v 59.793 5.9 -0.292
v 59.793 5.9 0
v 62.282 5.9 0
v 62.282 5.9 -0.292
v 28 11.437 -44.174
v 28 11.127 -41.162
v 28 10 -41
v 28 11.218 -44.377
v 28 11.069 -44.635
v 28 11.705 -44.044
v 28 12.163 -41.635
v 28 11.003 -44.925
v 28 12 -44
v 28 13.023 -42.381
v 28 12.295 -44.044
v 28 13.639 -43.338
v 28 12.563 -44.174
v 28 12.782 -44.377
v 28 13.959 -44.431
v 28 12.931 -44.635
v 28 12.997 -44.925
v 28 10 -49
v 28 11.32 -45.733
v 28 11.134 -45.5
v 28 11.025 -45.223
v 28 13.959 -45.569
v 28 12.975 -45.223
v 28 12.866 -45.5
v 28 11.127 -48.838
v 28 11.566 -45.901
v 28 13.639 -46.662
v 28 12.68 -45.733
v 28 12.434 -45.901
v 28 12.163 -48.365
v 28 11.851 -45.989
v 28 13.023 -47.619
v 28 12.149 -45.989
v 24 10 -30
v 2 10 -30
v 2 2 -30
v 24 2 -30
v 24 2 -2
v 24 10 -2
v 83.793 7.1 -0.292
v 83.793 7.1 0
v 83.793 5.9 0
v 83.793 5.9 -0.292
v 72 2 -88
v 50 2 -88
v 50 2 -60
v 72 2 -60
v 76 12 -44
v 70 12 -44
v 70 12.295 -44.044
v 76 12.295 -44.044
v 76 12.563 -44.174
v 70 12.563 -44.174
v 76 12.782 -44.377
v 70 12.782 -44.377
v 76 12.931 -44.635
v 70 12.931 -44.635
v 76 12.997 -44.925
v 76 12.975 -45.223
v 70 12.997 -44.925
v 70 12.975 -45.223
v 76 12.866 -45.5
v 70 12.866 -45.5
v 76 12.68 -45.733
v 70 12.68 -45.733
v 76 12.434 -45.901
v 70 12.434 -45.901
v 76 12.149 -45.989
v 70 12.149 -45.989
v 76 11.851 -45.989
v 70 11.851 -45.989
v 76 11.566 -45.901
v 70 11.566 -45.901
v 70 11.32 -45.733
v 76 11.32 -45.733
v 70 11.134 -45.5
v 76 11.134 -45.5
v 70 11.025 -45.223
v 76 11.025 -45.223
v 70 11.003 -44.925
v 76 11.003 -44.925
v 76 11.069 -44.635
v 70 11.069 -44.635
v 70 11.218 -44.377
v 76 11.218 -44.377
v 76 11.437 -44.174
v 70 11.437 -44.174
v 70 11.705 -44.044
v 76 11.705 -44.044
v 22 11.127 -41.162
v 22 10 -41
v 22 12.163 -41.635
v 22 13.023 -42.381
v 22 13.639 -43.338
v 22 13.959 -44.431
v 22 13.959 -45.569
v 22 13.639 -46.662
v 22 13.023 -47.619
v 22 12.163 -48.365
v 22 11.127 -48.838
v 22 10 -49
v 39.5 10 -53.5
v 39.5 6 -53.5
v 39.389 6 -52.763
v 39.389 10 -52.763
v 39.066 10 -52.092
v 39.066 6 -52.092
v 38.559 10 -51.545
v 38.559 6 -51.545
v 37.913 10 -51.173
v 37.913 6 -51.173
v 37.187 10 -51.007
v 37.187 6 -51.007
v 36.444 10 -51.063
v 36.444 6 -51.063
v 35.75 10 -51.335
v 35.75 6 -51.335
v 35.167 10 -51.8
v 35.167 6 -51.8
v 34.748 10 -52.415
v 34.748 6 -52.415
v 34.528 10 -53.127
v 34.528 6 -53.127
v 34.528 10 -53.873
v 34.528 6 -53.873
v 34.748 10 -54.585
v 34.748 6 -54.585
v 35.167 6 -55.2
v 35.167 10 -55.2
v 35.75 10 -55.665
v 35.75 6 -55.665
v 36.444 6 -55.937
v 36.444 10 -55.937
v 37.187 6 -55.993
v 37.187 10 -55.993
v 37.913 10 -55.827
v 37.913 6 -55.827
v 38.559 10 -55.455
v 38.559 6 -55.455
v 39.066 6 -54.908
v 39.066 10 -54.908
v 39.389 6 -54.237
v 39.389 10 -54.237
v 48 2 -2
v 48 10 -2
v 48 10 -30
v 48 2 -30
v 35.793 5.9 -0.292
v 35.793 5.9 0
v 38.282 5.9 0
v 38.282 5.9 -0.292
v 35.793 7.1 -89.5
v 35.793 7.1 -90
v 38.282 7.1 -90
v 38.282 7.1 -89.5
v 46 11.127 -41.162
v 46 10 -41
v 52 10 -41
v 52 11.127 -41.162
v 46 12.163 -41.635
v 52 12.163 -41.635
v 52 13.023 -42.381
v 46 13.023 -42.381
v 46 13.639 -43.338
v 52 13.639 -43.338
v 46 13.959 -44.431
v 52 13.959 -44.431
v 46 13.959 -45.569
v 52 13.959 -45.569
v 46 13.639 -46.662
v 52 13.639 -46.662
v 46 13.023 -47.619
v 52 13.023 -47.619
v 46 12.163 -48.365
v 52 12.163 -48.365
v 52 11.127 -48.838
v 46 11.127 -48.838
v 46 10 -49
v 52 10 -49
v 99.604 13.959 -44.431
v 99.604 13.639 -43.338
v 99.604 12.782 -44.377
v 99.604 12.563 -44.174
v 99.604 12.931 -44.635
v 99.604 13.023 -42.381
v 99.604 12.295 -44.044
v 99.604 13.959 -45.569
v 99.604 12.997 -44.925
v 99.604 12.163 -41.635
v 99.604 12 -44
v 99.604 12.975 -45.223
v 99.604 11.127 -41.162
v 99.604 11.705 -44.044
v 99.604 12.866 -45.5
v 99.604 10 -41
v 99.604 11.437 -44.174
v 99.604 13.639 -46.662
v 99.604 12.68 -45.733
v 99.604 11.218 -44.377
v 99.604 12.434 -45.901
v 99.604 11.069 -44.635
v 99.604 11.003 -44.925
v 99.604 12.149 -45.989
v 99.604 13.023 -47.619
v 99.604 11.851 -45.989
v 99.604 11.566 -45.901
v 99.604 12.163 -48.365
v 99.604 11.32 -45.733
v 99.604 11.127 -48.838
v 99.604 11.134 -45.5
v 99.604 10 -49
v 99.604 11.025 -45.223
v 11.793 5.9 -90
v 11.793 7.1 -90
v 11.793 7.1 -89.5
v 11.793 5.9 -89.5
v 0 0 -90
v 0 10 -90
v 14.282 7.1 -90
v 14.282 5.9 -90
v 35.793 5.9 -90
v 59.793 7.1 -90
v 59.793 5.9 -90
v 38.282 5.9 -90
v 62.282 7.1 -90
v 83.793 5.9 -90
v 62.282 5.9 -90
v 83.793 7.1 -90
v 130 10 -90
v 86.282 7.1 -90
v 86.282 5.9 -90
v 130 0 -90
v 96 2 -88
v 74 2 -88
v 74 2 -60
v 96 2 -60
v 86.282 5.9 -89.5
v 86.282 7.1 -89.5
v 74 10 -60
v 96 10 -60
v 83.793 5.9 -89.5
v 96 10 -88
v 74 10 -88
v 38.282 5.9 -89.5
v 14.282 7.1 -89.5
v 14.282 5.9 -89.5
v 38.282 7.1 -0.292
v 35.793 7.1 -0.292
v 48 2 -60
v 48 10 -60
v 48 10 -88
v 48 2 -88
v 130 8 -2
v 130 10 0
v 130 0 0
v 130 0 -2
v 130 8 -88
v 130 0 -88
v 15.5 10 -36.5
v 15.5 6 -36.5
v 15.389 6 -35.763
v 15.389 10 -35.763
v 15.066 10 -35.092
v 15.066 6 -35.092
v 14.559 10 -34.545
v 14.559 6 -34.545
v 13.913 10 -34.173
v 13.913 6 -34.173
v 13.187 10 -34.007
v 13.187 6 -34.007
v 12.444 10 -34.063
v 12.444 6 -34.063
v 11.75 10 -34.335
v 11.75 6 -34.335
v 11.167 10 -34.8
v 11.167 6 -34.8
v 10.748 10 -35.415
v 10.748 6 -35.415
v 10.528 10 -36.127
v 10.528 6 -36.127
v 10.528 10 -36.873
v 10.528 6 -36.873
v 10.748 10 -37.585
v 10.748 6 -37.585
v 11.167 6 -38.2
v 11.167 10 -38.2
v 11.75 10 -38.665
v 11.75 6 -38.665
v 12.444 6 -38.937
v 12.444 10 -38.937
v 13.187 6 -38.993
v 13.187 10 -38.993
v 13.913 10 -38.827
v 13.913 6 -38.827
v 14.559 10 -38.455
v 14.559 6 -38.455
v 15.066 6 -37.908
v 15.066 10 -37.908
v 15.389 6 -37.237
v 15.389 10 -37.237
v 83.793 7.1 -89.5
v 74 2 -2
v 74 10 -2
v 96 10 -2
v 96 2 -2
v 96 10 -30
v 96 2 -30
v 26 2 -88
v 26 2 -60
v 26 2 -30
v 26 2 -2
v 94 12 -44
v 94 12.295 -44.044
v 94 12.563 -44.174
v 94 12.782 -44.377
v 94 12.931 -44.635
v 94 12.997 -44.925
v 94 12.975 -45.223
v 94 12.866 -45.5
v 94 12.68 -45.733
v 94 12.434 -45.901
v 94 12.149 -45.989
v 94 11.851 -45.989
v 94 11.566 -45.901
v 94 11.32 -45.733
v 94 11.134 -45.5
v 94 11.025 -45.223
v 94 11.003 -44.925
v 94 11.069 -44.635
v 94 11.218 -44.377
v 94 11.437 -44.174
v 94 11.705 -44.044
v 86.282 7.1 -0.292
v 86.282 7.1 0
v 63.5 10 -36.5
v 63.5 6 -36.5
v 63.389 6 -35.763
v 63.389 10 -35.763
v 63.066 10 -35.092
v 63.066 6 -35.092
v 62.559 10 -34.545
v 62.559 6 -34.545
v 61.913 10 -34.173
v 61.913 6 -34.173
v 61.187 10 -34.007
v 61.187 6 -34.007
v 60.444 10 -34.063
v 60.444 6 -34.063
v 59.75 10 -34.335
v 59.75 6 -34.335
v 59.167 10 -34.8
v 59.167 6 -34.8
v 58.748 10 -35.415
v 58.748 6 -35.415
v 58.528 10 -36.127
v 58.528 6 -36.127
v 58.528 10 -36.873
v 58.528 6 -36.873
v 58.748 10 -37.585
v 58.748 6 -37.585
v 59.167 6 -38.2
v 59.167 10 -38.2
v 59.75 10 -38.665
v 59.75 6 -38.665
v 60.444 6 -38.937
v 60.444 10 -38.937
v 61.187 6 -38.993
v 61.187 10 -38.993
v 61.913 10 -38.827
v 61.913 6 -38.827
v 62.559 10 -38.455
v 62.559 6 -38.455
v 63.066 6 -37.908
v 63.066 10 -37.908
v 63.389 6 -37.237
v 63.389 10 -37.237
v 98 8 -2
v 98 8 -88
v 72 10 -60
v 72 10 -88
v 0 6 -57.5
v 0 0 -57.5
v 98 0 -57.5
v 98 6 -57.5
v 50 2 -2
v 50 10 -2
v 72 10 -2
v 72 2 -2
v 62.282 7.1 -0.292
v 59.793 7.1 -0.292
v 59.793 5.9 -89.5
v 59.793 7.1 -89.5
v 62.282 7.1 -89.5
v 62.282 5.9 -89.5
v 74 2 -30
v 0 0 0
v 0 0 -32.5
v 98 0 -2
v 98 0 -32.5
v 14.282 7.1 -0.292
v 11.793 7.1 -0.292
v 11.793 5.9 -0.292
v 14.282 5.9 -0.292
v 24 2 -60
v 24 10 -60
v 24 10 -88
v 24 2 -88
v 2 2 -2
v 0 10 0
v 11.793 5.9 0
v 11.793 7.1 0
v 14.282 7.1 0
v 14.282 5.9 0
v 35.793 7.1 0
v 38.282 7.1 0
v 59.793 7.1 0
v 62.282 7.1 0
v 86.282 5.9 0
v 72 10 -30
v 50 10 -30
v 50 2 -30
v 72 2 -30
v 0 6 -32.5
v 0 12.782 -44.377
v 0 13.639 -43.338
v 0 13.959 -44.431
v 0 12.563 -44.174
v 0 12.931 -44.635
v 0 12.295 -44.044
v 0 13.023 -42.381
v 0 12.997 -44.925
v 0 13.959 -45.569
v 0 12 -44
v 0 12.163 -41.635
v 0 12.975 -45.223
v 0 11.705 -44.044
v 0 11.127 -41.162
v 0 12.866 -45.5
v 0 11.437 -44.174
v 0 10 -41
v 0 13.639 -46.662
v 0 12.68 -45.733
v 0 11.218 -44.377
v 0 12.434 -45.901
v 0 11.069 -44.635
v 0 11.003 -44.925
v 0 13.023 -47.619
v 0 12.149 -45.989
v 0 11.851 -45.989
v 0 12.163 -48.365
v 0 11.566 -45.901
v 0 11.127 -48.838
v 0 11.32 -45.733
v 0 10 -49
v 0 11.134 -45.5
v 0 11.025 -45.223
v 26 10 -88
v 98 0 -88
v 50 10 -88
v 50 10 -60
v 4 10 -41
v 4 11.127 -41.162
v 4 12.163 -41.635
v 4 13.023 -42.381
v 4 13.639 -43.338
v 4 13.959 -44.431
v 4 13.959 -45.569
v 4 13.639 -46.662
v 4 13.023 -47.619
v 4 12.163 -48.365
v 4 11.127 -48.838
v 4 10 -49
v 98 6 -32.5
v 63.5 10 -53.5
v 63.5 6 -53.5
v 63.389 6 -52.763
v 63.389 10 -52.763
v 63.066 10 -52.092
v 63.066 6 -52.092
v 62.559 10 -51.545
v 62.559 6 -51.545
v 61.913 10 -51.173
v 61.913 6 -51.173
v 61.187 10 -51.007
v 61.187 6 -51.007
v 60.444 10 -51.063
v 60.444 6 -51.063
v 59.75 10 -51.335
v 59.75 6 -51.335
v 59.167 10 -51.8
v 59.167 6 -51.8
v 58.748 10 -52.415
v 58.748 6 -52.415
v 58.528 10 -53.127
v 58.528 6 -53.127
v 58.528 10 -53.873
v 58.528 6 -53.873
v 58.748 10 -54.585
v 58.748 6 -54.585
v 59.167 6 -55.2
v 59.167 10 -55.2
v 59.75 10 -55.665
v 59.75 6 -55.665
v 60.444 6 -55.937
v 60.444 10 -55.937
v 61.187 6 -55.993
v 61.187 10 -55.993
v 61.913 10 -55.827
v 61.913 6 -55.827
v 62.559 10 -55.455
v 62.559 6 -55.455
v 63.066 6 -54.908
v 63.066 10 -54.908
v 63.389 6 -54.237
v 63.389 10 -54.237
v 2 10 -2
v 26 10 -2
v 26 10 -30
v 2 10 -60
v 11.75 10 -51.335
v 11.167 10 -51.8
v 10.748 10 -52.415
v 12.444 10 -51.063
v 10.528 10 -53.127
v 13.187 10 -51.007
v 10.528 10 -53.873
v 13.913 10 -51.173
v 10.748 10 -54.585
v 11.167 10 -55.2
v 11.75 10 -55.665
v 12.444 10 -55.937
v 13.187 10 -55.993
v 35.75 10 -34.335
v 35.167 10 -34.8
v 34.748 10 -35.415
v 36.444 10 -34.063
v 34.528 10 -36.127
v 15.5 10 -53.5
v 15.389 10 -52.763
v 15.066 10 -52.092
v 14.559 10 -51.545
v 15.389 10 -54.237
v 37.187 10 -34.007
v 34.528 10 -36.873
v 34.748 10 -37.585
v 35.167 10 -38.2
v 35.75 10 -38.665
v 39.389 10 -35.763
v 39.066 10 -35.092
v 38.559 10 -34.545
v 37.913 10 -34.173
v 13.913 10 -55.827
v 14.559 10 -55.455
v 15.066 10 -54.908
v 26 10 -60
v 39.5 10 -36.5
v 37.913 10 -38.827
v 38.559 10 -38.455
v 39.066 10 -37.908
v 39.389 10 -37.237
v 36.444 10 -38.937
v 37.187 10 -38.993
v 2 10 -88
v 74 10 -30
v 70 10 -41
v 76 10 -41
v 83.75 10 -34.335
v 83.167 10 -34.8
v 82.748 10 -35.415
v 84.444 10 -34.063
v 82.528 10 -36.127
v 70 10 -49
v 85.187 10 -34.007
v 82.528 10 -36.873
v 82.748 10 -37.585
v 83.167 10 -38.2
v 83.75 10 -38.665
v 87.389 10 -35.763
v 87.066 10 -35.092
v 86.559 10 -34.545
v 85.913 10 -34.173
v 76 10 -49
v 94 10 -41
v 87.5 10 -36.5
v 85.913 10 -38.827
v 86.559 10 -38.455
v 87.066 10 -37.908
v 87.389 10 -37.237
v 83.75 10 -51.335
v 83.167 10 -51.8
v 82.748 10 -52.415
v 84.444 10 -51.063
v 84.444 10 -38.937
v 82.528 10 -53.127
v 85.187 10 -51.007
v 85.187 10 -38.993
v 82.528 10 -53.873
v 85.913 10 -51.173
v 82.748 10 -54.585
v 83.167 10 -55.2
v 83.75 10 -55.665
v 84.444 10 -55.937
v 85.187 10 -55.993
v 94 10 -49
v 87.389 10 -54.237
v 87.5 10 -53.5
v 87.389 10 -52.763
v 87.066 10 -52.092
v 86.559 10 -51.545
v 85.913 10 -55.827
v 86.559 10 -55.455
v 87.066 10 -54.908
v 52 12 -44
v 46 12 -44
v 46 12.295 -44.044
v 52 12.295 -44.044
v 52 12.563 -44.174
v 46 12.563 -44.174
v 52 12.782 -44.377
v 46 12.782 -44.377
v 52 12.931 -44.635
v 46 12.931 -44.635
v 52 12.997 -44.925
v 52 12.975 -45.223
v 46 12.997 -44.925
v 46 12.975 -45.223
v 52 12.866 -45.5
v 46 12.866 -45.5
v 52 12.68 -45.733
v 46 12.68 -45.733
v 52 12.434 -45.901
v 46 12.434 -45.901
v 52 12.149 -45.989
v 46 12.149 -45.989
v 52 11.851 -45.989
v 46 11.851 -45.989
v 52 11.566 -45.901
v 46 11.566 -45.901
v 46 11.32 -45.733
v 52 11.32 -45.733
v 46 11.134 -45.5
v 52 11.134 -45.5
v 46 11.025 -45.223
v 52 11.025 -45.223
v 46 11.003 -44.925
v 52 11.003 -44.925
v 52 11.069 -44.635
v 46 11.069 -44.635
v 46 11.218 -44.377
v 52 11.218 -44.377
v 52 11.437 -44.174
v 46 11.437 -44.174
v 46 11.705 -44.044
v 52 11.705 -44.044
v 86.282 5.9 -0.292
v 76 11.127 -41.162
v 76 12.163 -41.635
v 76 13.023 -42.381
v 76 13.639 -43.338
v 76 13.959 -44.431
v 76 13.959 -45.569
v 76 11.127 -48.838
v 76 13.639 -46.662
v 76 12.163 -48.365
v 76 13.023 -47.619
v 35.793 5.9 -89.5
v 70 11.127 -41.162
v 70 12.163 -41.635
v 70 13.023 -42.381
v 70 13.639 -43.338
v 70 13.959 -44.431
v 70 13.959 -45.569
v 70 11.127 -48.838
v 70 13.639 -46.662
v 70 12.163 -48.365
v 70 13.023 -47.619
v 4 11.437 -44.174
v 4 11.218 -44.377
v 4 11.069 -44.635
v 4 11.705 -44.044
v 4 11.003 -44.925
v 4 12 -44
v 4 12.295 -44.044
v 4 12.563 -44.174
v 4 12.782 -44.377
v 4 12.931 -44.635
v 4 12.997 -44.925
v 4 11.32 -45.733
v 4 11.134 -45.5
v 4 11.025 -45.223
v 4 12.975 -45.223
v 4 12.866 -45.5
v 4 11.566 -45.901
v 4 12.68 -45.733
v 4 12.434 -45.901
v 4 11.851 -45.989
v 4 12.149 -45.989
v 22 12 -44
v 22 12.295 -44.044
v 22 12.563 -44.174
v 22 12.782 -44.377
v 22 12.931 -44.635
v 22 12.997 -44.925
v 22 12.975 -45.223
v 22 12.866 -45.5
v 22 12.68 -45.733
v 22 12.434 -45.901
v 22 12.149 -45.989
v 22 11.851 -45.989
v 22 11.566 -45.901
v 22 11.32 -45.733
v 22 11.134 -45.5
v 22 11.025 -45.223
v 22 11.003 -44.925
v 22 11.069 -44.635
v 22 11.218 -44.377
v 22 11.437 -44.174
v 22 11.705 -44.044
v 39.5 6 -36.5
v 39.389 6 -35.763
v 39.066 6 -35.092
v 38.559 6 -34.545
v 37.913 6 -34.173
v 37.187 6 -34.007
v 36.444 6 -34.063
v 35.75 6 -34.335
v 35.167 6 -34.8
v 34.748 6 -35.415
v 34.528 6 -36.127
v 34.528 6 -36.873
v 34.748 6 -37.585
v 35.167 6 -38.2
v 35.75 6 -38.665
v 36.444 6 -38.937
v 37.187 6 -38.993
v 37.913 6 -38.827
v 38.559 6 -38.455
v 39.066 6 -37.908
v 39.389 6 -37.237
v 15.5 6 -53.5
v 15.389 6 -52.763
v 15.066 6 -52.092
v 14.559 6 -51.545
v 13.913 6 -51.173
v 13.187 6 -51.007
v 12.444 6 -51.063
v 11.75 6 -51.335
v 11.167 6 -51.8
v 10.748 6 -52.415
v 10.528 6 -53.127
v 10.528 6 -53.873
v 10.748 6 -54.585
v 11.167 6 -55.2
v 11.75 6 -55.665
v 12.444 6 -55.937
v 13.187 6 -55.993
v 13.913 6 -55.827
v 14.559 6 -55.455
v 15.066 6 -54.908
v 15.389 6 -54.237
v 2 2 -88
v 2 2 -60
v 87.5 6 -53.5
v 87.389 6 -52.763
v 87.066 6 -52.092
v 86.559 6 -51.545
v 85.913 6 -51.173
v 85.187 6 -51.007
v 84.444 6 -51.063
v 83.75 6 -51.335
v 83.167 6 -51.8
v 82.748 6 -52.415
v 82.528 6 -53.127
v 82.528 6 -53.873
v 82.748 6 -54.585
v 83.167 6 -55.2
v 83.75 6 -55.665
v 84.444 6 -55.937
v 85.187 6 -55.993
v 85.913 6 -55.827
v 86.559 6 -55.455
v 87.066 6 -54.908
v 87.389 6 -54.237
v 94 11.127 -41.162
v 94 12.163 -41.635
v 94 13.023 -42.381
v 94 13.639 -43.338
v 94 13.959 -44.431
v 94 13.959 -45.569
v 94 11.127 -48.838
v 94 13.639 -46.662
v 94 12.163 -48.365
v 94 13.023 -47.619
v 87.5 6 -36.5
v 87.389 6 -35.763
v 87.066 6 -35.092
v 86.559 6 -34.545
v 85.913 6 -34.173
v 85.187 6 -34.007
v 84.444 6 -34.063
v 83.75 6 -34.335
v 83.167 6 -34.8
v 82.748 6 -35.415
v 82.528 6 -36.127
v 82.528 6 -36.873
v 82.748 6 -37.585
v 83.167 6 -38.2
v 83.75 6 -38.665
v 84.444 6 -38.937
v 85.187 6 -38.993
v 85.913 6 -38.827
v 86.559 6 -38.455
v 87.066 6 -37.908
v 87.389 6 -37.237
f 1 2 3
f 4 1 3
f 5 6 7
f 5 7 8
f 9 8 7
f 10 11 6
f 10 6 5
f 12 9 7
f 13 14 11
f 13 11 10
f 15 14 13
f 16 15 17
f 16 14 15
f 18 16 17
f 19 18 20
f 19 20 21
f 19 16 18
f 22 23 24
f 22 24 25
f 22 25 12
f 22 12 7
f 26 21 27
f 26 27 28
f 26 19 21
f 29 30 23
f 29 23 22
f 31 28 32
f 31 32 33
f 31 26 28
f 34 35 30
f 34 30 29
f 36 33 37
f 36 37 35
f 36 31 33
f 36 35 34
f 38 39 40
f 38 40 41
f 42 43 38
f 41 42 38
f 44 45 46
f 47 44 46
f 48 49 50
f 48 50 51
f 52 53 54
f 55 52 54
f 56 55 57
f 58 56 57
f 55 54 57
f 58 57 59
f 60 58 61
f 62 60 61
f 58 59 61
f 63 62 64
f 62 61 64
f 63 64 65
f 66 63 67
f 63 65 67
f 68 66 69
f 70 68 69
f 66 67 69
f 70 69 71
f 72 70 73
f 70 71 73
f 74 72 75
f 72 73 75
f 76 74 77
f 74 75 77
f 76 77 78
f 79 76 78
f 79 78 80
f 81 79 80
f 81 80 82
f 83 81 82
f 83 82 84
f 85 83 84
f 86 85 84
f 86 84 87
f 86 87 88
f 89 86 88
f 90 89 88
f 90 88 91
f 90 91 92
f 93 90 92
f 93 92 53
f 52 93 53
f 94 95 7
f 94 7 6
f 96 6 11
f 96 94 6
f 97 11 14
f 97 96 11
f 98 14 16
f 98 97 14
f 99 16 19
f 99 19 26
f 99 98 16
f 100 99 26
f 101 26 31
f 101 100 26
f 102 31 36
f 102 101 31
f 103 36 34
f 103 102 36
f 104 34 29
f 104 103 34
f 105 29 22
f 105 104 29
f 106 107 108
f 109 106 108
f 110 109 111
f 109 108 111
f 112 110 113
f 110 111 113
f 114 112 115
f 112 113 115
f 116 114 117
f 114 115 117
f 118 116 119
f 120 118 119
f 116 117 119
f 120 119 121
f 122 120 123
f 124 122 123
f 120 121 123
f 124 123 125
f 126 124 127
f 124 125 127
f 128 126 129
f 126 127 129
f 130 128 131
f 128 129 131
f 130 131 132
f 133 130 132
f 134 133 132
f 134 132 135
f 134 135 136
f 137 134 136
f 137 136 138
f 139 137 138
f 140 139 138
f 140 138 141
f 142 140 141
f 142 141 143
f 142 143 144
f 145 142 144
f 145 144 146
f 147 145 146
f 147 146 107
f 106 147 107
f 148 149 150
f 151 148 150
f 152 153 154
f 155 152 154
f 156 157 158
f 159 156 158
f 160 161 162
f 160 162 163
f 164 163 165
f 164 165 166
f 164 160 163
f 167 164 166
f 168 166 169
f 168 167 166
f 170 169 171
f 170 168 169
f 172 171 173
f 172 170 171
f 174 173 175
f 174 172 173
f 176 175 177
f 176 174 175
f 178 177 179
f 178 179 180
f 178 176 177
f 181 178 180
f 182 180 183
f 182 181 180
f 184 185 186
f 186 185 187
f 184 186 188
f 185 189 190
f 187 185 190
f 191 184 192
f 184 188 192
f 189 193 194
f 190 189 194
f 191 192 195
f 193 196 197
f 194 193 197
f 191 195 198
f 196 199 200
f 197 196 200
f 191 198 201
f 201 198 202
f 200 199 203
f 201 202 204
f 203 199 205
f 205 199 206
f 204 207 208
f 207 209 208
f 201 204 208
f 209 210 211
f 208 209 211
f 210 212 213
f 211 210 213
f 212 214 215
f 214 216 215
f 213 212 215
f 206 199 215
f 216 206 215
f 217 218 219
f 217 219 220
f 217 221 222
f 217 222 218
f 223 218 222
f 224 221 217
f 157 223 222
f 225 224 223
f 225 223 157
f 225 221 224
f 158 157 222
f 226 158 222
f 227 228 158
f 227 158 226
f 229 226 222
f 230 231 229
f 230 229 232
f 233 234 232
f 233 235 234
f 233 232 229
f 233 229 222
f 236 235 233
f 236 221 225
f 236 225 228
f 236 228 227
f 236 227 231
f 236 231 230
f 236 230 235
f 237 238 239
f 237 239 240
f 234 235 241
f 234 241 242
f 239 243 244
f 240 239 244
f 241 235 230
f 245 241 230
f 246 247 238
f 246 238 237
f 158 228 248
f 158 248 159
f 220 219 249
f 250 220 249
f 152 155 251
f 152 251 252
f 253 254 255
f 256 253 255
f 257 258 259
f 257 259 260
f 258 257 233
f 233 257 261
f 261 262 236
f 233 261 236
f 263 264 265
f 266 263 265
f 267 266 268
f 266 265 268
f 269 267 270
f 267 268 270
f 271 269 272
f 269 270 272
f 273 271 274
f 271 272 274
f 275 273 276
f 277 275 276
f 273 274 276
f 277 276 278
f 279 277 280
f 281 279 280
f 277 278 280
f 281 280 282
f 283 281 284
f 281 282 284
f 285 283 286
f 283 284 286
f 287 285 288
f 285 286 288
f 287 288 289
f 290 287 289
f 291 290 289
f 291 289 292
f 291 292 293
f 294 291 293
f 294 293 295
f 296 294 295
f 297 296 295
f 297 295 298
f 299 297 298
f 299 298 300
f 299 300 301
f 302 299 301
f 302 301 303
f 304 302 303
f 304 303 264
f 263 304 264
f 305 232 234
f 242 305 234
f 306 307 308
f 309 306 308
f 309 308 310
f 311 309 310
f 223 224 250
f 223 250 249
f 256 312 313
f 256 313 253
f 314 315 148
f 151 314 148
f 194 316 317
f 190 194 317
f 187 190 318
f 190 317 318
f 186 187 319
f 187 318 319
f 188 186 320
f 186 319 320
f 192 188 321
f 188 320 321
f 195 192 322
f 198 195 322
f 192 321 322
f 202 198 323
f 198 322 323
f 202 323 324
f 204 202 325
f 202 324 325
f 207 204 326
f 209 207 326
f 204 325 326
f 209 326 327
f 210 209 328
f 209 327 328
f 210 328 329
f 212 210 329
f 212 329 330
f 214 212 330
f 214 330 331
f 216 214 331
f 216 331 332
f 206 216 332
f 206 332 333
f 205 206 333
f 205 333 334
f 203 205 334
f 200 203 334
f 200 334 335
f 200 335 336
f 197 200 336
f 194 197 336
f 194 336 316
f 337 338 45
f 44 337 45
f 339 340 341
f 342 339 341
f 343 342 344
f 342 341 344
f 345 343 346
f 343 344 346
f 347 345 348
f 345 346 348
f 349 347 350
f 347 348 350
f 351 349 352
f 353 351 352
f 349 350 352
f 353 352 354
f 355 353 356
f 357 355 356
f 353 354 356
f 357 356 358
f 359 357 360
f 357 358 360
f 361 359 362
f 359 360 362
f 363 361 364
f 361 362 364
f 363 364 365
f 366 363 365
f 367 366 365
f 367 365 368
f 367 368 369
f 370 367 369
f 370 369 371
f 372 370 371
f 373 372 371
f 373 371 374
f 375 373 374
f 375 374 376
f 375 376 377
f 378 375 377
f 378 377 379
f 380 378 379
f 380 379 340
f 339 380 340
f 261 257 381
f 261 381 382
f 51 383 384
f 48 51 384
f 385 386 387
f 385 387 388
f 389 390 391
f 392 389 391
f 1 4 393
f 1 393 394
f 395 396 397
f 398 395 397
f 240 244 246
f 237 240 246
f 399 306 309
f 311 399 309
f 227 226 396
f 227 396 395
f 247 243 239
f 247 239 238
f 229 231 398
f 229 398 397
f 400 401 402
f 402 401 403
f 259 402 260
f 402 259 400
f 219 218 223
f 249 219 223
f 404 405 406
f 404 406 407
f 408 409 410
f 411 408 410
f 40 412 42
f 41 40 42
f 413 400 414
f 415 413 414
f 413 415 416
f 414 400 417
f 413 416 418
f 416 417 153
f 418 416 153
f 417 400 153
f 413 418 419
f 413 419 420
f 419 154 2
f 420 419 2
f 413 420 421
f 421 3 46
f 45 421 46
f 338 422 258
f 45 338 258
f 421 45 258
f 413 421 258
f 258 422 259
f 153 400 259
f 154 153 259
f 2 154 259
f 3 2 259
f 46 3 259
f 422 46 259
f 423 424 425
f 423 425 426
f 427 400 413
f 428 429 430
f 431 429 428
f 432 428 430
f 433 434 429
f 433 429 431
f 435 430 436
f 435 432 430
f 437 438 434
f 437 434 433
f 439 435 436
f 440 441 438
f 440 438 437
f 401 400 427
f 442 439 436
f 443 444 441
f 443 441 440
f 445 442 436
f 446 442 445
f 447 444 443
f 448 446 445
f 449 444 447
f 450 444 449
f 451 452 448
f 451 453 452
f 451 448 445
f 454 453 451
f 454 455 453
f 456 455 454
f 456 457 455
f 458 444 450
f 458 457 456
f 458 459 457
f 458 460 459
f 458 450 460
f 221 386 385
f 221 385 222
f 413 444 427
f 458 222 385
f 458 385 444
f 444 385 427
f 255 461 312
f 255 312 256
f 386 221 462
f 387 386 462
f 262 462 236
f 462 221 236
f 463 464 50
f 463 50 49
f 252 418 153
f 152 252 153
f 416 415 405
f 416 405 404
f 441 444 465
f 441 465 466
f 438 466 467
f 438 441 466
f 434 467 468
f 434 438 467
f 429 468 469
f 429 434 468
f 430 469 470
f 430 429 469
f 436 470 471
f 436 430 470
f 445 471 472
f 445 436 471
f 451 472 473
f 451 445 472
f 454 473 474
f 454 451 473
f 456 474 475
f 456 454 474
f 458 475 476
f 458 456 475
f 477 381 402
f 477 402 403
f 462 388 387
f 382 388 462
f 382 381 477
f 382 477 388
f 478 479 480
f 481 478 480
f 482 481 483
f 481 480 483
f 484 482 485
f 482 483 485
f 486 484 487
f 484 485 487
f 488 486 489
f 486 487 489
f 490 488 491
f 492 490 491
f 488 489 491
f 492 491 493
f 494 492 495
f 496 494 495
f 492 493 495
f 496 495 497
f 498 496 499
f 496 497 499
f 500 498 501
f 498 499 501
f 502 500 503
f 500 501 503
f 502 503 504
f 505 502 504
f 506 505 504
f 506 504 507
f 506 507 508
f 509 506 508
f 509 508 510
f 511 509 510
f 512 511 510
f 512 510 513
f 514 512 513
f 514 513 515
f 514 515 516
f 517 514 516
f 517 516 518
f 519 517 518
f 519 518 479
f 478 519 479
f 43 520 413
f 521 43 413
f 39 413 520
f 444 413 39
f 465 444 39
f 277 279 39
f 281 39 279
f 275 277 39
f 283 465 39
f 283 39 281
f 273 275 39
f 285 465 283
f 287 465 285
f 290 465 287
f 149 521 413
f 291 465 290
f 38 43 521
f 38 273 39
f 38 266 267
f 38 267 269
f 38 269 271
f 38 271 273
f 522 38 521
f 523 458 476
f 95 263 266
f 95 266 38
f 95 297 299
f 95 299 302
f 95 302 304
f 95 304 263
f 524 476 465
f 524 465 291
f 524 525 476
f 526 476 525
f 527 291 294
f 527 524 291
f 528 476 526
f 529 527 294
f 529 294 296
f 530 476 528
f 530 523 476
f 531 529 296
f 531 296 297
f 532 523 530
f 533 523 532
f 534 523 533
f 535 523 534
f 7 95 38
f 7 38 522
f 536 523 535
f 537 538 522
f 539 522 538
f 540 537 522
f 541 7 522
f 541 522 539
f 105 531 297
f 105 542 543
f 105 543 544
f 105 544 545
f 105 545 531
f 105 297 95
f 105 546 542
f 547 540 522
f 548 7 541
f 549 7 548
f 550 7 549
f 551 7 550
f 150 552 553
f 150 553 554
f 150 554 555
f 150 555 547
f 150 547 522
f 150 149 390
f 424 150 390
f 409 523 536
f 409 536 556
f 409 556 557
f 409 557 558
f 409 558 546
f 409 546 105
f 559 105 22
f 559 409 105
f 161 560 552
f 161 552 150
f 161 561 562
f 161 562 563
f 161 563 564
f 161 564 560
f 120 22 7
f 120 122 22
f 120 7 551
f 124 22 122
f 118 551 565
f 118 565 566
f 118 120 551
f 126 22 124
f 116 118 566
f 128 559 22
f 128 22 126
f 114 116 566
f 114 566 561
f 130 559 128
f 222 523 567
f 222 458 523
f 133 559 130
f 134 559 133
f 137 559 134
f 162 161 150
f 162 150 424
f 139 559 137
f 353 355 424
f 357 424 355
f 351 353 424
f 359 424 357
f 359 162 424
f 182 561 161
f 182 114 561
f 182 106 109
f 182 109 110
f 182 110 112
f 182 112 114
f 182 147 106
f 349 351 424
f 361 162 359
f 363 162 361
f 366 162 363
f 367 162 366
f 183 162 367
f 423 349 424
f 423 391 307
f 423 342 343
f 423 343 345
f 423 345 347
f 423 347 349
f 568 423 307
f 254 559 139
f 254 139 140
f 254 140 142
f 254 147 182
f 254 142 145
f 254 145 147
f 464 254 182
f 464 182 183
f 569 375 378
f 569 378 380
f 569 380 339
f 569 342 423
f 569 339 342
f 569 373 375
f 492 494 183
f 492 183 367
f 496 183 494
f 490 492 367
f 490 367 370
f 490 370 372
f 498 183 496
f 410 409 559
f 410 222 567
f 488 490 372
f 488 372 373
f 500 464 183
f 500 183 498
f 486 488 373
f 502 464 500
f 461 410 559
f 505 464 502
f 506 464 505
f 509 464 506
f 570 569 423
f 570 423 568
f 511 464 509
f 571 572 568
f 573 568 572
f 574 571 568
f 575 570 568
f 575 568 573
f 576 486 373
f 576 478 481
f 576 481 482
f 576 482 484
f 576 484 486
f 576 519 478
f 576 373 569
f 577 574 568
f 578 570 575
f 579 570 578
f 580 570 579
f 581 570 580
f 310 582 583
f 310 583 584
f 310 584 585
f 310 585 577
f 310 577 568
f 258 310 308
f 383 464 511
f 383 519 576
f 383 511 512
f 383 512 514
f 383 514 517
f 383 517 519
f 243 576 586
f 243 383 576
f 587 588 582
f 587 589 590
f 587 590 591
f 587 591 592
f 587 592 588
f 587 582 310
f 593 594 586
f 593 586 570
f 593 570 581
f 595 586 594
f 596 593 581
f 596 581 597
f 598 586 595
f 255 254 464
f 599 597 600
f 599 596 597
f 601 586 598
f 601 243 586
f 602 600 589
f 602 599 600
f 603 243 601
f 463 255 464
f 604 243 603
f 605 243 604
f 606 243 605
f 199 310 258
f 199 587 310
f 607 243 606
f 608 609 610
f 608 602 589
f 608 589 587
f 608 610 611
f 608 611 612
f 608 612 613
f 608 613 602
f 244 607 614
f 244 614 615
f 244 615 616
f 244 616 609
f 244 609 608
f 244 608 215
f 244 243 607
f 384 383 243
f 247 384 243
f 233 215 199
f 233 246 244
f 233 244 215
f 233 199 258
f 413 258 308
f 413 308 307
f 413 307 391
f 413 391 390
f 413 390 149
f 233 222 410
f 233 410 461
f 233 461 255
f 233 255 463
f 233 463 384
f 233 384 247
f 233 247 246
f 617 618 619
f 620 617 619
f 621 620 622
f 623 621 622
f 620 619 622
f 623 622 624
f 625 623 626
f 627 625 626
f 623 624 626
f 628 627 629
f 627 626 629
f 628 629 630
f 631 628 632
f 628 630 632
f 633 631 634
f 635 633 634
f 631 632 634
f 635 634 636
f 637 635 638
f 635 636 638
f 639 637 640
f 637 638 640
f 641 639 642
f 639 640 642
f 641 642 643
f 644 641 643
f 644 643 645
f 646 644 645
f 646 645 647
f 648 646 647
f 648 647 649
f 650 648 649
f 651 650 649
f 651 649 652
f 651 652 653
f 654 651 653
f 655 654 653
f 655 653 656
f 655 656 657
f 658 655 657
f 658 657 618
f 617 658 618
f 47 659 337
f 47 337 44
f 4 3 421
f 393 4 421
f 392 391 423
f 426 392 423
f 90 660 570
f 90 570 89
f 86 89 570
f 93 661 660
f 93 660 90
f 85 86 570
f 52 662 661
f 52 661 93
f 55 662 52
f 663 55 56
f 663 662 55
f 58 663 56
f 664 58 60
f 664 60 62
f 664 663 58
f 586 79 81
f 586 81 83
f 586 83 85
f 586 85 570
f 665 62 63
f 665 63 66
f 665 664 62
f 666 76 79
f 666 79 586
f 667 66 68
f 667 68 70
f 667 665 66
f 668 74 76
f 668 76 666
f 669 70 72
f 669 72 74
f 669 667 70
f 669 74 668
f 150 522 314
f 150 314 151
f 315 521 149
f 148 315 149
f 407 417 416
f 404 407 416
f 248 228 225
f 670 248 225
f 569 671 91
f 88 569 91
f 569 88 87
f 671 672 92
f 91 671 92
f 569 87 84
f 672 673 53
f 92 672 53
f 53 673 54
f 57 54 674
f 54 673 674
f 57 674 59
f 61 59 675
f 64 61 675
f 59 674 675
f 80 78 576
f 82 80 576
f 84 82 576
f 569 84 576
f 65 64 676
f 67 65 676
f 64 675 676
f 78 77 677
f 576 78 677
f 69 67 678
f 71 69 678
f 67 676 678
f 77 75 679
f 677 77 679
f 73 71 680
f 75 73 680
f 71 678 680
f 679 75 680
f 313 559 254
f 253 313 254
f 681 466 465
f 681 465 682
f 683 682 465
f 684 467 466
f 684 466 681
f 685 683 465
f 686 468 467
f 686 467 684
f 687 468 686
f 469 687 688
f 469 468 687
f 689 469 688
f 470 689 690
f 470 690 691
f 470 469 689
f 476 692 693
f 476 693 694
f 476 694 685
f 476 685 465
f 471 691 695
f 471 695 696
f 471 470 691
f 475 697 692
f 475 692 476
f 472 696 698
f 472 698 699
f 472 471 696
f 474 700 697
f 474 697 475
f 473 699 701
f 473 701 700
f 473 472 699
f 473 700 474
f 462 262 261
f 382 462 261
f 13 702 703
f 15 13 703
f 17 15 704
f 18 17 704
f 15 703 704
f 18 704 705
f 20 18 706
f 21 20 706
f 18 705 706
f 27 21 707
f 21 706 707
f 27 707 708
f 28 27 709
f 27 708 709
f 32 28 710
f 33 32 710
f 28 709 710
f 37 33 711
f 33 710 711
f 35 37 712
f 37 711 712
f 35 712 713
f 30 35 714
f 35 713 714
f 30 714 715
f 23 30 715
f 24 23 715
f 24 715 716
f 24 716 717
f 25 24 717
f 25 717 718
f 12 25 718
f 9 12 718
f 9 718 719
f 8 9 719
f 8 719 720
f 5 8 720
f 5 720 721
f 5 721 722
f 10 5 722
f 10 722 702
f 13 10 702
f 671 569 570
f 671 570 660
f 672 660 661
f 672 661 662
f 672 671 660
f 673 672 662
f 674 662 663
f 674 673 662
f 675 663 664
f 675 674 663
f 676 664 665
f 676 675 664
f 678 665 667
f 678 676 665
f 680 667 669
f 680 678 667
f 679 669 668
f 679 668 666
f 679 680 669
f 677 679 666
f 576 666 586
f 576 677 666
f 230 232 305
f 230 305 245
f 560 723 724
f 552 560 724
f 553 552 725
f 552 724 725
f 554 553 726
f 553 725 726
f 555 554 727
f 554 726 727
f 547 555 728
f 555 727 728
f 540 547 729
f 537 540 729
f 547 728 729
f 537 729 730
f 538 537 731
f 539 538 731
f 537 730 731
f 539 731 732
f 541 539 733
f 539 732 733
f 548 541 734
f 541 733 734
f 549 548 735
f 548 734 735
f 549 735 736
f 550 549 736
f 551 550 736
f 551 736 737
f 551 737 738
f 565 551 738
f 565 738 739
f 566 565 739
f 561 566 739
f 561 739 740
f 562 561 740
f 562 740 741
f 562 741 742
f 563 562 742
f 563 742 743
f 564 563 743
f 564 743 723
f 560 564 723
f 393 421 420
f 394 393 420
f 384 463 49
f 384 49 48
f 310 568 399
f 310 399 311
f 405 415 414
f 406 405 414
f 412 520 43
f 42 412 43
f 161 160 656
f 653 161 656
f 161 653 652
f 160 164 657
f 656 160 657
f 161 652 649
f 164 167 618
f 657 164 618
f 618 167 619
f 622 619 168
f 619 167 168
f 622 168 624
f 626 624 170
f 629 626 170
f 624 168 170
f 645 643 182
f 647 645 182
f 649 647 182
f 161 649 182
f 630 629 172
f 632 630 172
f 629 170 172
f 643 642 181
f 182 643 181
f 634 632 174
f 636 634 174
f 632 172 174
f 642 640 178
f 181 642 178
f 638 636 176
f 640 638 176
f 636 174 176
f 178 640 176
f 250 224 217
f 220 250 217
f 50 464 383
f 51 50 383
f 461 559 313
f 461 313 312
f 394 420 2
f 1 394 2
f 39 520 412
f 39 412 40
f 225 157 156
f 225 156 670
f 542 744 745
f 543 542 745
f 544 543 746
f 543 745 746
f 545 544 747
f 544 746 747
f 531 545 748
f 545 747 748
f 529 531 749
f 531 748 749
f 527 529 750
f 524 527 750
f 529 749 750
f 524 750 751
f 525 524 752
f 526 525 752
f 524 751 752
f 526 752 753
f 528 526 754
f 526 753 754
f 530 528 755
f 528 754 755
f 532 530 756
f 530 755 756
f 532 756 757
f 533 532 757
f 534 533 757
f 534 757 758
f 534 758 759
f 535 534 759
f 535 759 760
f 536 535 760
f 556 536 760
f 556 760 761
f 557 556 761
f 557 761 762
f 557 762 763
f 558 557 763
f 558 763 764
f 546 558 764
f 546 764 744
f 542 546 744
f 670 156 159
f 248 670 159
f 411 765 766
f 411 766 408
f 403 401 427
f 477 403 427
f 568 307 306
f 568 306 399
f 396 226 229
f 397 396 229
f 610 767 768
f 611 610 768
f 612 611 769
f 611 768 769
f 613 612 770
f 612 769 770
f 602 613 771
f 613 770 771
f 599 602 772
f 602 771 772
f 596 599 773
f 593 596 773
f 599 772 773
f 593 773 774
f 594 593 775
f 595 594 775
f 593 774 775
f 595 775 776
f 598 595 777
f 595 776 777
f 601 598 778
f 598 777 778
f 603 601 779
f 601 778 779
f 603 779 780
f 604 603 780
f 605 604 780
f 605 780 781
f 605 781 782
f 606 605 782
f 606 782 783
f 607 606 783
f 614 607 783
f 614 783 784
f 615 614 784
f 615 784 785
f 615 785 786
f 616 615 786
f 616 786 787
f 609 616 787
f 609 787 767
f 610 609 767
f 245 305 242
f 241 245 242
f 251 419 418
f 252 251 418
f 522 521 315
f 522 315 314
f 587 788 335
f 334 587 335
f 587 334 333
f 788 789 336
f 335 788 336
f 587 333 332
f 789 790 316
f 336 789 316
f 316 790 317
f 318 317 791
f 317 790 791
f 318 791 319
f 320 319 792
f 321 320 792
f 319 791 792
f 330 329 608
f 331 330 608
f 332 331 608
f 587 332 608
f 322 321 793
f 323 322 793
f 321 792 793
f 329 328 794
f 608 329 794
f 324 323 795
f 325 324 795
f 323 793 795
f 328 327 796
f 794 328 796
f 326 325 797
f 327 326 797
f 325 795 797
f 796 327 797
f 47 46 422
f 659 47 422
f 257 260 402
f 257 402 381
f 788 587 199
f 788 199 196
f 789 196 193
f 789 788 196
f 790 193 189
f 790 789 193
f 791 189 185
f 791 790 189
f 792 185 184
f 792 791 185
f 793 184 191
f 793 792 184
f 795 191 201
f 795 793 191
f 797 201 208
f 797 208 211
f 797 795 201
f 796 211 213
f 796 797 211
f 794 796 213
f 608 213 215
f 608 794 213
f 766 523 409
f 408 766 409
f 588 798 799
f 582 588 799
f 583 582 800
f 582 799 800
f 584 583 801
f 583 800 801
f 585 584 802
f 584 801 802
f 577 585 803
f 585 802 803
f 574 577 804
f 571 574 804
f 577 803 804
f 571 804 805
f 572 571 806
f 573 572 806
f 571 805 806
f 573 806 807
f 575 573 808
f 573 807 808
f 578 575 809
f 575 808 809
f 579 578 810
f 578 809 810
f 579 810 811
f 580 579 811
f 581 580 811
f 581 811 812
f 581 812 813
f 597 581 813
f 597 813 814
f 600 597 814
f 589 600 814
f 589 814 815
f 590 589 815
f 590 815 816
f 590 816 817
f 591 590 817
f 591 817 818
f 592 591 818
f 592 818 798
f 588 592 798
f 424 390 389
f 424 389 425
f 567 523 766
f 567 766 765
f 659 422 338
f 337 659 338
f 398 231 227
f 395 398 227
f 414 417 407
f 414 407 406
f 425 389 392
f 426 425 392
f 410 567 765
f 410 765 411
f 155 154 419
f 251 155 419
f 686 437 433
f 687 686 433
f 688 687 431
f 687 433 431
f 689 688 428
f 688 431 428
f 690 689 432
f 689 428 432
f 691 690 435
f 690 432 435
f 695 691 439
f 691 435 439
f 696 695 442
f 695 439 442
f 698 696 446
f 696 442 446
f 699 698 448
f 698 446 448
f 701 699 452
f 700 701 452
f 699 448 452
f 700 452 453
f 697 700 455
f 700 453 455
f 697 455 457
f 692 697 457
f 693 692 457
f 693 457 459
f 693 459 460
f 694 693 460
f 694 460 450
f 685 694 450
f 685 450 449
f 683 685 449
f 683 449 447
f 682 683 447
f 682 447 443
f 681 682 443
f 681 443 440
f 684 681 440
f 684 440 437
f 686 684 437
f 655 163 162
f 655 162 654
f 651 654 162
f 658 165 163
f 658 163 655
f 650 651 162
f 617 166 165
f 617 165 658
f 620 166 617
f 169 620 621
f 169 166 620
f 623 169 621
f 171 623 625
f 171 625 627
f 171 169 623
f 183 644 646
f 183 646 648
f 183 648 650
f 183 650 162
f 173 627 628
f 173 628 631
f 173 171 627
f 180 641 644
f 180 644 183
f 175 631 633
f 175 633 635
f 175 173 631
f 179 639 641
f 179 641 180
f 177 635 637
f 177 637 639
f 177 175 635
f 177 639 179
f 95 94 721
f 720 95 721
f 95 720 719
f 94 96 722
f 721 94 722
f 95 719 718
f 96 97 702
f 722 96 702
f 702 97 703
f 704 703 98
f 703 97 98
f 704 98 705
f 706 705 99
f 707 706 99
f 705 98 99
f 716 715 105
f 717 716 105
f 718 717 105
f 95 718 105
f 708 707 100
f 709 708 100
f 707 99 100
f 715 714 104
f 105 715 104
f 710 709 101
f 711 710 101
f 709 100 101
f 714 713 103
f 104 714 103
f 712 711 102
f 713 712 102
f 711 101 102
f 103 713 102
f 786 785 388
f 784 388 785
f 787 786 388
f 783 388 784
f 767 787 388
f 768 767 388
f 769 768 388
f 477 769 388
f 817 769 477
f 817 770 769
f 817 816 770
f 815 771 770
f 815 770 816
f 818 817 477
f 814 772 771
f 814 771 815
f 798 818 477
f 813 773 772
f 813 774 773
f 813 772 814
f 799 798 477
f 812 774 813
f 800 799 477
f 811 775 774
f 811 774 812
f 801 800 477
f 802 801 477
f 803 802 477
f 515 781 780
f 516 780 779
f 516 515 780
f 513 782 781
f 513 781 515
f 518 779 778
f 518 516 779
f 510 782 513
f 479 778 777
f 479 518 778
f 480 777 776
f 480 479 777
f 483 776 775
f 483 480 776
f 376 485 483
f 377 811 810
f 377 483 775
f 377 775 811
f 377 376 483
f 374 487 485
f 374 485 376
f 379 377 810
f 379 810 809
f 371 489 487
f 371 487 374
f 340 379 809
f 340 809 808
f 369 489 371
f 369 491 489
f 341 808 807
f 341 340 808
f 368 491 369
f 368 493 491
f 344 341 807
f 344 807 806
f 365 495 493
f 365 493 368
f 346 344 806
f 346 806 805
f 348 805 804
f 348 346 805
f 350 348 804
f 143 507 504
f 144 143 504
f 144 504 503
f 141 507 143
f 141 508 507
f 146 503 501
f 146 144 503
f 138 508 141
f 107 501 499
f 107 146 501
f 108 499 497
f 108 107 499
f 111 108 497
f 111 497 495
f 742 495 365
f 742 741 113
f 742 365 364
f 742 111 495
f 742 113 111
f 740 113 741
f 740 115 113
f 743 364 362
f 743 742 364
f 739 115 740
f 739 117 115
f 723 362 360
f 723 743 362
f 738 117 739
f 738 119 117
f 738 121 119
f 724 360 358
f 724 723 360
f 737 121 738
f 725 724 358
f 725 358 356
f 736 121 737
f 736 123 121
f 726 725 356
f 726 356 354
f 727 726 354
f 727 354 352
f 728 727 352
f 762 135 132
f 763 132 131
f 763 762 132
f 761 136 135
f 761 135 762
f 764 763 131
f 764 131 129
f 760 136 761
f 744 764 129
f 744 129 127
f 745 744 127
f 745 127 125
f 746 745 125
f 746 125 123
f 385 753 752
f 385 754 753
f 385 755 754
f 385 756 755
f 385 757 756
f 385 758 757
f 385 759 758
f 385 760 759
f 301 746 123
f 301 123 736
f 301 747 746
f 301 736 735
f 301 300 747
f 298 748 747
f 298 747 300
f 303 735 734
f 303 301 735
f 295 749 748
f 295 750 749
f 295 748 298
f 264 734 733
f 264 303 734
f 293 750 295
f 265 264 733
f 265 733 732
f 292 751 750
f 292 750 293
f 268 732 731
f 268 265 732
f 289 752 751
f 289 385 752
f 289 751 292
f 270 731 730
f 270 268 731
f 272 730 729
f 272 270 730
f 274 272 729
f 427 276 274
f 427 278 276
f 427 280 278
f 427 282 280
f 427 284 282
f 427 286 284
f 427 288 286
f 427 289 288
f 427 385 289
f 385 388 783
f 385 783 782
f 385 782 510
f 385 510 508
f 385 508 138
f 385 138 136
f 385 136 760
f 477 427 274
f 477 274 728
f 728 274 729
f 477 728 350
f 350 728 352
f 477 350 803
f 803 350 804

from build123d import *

# Parameters (mm, degrees)
SKETCH_1_W             = 130
SKETCH_1_H             = 90
EXTRUDE_1_DEPTH        = 10
SKETCH_2_W             = 22
SKETCH_2_H             = 28
CUT_EXTRUDE_1_DEPTH    = 8
SKETCH_3_W             = 25
SKETCH_3_H             = 6
CUT_EXTRUDE_2_DEPTH    = 131
EXTRUDE_2_DEPTH        = 130
SKETCH_7_R             = 2.5
CUT_EXTRUDE_5_DEPTH    = 9
SKETCH_5_R             = 1
CUT_EXTRUDE_6_DEPTH    = 131
CUT_EXTRUDE_8_DEPTH    = 18
PATTERN_LINEAR_1_COUNT = 4
PATTERN_LINEAR_1_PITCH = 24
CUT_EXTRUDE_9_DEPTH    = 0.5
PATTERN_LINEAR_2_COUNT = 4
PATTERN_LINEAR_2_PITCH = 24
MIRROR_1_COPY_1_DEPTH  = 0.5
MIRROR_1_COPY_2_DEPTH  = 0.5
MIRROR_1_COPY_3_DEPTH  = 0.5
SKETCH_11_W            = 86
SKETCH_11_H            = 8
CUT_EXTRUDE_10_DEPTH   = 32
SKETCH_12_W            = 30.395595504
SKETCH_12_H            = 8
CUT_EXTRUDE_11_DEPTH   = 8


with BuildPart() as part:
    # 草图1 → 凸台-拉伸1 (new body)
    with BuildSketch(Plane(origin=(0, 0, 0), x_dir=(1, 0, 0), z_dir=(0, 1, 0))):
        with Locations((65, 45)):
            Rectangle(SKETCH_1_W, SKETCH_1_H)
    extrude(amount=EXTRUDE_1_DEPTH)

    # 草图2 → 切除-拉伸1 (cut)
    with BuildSketch(Plane(origin=(0, 10, 0), x_dir=(1, 0, 0), z_dir=(0, 1, 0))):
        with Locations((13, 74)):
            Rectangle(SKETCH_2_W, SKETCH_2_H)
        with Locations((37, 74)):
            Rectangle(SKETCH_2_W, SKETCH_2_H)
        with Locations((61, 74)):
            Rectangle(SKETCH_2_W, SKETCH_2_H)
        with Locations((85, 74)):
            Rectangle(SKETCH_2_W, SKETCH_2_H)
        with Locations((37, 16)):
            Rectangle(SKETCH_2_W, SKETCH_2_H)
        with Locations((61, 16)):
            Rectangle(SKETCH_2_W, SKETCH_2_H)
        with Locations((85, 16)):
            Rectangle(SKETCH_2_W, SKETCH_2_H)
        with Locations((13, 16)):
            Rectangle(SKETCH_2_W, SKETCH_2_H)
    extrude(amount=-CUT_EXTRUDE_1_DEPTH, mode=Mode.SUBTRACT)

    # 草图3 → 切除-拉伸2 (cut, through all)
    with BuildSketch(Plane.ZY):
        with Locations((-45, 3)):
            Rectangle(SKETCH_3_W, SKETCH_3_H)
    extrude(amount=-CUT_EXTRUDE_2_DEPTH, mode=Mode.SUBTRACT)

    # 草图4 → 凸台-拉伸2 (add, through all)
    with BuildSketch(Plane.ZY):
        with BuildLine():
            Line((-49, 10), (-41, 10))
            ThreePointArc((-41, 10), (-45, 14), (-49, 10))
        make_face()
    extrude(amount=-EXTRUDE_2_DEPTH)

    # 草图7 → 切除-拉伸5 (cut, through all)
    with BuildSketch(Plane.XZ.offset(-6)):
        with Locations((13, -36.5)):
            Circle(SKETCH_7_R)
        with Locations((37, -36.5)):
            Circle(SKETCH_7_R)
        with Locations((61, -36.5)):
            Circle(SKETCH_7_R)
        with Locations((85, -36.5)):
            Circle(SKETCH_7_R)
        with Locations((85, -53.5)):
            Circle(SKETCH_7_R)
        with Locations((61, -53.5)):
            Circle(SKETCH_7_R)
        with Locations((37, -53.5)):
            Circle(SKETCH_7_R)
        with Locations((13, -53.5)):
            Circle(SKETCH_7_R)
    extrude(amount=-CUT_EXTRUDE_5_DEPTH, mode=Mode.SUBTRACT)

    # 草图5 → 切除-拉伸6 (cut, through all)
    with BuildSketch(Plane.ZY):
        with Locations((-45, 12)):
            Circle(SKETCH_5_R)
    extrude(amount=-CUT_EXTRUDE_6_DEPTH, mode=Mode.SUBTRACT)

    # 草图8 → 切除-拉伸8 (cut)
    with BuildSketch(Plane.ZY.offset(-4)):
        Polygon((-49, 10), (-49, 15.914476158), (-40.761753379, 15.914476158), (-41, 10), align=None)
    cut_extrude_8 = extrude(amount=-CUT_EXTRUDE_8_DEPTH, mode=Mode.SUBTRACT)

    # 阵列(线性)1: 切除-拉伸8 ×4
    with Locations(*[(i * PATTERN_LINEAR_1_PITCH, 0, 0) for i in range(1, PATTERN_LINEAR_1_COUNT)]):
        add(cut_extrude_8, mode=Mode.SUBTRACT)

    # 草图10 → 切除-拉伸9 (cut)
    with BuildSketch(Plane(origin=(0, 0, -90), x_dir=(-1, 0, 0), z_dir=(0, 0, -1))):
        Polygon((-12.992503856, 7.1), (-11.792503856, 7.1), (-11.792503856, 5.9), (-13.082457584, 5.9), (-14.282457584, 5.9), (-14.282457584, 7.1), align=None)
    cut_extrude_9 = extrude(amount=-CUT_EXTRUDE_9_DEPTH, mode=Mode.SUBTRACT)

    # 阵列(线性)2: 切除-拉伸9 ×4
    with Locations(*[(i * PATTERN_LINEAR_2_PITCH, 0, 0) for i in range(1, PATTERN_LINEAR_2_COUNT)]):
        add(cut_extrude_9, mode=Mode.SUBTRACT)

    # 镜向1: 切除-拉伸9 across plane
    add(cut_extrude_9.mirror(Plane.XY.offset(-44.896142346)), mode=Mode.SUBTRACT)

    # 镜向1 copy 1 sketch → 镜向1 copy 1 (cut)
    with BuildSketch(Plane(origin=(24, 0, 0.207715309), x_dir=(-1, 0, 0), z_dir=(0, 0, 1))):
        Polygon((-12.992503856, -7.1), (-11.792503856, -7.1), (-11.792503856, -5.9), (-13.082457584, -5.9), (-14.282457584, -5.9), (-14.282457584, -7.1), align=None)
    extrude(amount=-MIRROR_1_COPY_1_DEPTH, mode=Mode.SUBTRACT)

    # 镜向1 copy 2 sketch → 镜向1 copy 2 (cut)
    with BuildSketch(Plane(origin=(48, 0, 0.207715309), x_dir=(-1, 0, 0), z_dir=(0, 0, 1))):
        Polygon((-12.992503856, -7.1), (-11.792503856, -7.1), (-11.792503856, -5.9), (-13.082457584, -5.9), (-14.282457584, -5.9), (-14.282457584, -7.1), align=None)
    extrude(amount=-MIRROR_1_COPY_2_DEPTH, mode=Mode.SUBTRACT)

    # 镜向1 copy 3 sketch → 镜向1 copy 3 (cut)
    with BuildSketch(Plane(origin=(72, 0, 0.207715309), x_dir=(-1, 0, 0), z_dir=(0, 0, 1))):
        Polygon((-12.992503856, -7.1), (-11.792503856, -7.1), (-11.792503856, -5.9), (-13.082457584, -5.9), (-14.282457584, -5.9), (-14.282457584, -7.1), align=None)
    extrude(amount=-MIRROR_1_COPY_3_DEPTH, mode=Mode.SUBTRACT)

    # 草图11 → 切除-拉伸10 (cut)
    with BuildSketch(Plane(origin=(130, 0, 0), x_dir=(0, 0, -1), z_dir=(1, 0, 0))):
        with Locations((45, 4)):
            Rectangle(SKETCH_11_W, SKETCH_11_H)
    extrude(amount=-CUT_EXTRUDE_10_DEPTH, mode=Mode.SUBTRACT)

    # 草图12 → 切除-拉伸11 (cut)
    with BuildSketch(Plane(origin=(0, 10, 0), x_dir=(1, 0, 0), z_dir=(0, 1, 0))):
        with Locations((114.802202248, 45)):
            Rectangle(SKETCH_12_W, SKETCH_12_H)
    extrude(amount=CUT_EXTRUDE_11_DEPTH, mode=Mode.SUBTRACT)


solid = part.part
